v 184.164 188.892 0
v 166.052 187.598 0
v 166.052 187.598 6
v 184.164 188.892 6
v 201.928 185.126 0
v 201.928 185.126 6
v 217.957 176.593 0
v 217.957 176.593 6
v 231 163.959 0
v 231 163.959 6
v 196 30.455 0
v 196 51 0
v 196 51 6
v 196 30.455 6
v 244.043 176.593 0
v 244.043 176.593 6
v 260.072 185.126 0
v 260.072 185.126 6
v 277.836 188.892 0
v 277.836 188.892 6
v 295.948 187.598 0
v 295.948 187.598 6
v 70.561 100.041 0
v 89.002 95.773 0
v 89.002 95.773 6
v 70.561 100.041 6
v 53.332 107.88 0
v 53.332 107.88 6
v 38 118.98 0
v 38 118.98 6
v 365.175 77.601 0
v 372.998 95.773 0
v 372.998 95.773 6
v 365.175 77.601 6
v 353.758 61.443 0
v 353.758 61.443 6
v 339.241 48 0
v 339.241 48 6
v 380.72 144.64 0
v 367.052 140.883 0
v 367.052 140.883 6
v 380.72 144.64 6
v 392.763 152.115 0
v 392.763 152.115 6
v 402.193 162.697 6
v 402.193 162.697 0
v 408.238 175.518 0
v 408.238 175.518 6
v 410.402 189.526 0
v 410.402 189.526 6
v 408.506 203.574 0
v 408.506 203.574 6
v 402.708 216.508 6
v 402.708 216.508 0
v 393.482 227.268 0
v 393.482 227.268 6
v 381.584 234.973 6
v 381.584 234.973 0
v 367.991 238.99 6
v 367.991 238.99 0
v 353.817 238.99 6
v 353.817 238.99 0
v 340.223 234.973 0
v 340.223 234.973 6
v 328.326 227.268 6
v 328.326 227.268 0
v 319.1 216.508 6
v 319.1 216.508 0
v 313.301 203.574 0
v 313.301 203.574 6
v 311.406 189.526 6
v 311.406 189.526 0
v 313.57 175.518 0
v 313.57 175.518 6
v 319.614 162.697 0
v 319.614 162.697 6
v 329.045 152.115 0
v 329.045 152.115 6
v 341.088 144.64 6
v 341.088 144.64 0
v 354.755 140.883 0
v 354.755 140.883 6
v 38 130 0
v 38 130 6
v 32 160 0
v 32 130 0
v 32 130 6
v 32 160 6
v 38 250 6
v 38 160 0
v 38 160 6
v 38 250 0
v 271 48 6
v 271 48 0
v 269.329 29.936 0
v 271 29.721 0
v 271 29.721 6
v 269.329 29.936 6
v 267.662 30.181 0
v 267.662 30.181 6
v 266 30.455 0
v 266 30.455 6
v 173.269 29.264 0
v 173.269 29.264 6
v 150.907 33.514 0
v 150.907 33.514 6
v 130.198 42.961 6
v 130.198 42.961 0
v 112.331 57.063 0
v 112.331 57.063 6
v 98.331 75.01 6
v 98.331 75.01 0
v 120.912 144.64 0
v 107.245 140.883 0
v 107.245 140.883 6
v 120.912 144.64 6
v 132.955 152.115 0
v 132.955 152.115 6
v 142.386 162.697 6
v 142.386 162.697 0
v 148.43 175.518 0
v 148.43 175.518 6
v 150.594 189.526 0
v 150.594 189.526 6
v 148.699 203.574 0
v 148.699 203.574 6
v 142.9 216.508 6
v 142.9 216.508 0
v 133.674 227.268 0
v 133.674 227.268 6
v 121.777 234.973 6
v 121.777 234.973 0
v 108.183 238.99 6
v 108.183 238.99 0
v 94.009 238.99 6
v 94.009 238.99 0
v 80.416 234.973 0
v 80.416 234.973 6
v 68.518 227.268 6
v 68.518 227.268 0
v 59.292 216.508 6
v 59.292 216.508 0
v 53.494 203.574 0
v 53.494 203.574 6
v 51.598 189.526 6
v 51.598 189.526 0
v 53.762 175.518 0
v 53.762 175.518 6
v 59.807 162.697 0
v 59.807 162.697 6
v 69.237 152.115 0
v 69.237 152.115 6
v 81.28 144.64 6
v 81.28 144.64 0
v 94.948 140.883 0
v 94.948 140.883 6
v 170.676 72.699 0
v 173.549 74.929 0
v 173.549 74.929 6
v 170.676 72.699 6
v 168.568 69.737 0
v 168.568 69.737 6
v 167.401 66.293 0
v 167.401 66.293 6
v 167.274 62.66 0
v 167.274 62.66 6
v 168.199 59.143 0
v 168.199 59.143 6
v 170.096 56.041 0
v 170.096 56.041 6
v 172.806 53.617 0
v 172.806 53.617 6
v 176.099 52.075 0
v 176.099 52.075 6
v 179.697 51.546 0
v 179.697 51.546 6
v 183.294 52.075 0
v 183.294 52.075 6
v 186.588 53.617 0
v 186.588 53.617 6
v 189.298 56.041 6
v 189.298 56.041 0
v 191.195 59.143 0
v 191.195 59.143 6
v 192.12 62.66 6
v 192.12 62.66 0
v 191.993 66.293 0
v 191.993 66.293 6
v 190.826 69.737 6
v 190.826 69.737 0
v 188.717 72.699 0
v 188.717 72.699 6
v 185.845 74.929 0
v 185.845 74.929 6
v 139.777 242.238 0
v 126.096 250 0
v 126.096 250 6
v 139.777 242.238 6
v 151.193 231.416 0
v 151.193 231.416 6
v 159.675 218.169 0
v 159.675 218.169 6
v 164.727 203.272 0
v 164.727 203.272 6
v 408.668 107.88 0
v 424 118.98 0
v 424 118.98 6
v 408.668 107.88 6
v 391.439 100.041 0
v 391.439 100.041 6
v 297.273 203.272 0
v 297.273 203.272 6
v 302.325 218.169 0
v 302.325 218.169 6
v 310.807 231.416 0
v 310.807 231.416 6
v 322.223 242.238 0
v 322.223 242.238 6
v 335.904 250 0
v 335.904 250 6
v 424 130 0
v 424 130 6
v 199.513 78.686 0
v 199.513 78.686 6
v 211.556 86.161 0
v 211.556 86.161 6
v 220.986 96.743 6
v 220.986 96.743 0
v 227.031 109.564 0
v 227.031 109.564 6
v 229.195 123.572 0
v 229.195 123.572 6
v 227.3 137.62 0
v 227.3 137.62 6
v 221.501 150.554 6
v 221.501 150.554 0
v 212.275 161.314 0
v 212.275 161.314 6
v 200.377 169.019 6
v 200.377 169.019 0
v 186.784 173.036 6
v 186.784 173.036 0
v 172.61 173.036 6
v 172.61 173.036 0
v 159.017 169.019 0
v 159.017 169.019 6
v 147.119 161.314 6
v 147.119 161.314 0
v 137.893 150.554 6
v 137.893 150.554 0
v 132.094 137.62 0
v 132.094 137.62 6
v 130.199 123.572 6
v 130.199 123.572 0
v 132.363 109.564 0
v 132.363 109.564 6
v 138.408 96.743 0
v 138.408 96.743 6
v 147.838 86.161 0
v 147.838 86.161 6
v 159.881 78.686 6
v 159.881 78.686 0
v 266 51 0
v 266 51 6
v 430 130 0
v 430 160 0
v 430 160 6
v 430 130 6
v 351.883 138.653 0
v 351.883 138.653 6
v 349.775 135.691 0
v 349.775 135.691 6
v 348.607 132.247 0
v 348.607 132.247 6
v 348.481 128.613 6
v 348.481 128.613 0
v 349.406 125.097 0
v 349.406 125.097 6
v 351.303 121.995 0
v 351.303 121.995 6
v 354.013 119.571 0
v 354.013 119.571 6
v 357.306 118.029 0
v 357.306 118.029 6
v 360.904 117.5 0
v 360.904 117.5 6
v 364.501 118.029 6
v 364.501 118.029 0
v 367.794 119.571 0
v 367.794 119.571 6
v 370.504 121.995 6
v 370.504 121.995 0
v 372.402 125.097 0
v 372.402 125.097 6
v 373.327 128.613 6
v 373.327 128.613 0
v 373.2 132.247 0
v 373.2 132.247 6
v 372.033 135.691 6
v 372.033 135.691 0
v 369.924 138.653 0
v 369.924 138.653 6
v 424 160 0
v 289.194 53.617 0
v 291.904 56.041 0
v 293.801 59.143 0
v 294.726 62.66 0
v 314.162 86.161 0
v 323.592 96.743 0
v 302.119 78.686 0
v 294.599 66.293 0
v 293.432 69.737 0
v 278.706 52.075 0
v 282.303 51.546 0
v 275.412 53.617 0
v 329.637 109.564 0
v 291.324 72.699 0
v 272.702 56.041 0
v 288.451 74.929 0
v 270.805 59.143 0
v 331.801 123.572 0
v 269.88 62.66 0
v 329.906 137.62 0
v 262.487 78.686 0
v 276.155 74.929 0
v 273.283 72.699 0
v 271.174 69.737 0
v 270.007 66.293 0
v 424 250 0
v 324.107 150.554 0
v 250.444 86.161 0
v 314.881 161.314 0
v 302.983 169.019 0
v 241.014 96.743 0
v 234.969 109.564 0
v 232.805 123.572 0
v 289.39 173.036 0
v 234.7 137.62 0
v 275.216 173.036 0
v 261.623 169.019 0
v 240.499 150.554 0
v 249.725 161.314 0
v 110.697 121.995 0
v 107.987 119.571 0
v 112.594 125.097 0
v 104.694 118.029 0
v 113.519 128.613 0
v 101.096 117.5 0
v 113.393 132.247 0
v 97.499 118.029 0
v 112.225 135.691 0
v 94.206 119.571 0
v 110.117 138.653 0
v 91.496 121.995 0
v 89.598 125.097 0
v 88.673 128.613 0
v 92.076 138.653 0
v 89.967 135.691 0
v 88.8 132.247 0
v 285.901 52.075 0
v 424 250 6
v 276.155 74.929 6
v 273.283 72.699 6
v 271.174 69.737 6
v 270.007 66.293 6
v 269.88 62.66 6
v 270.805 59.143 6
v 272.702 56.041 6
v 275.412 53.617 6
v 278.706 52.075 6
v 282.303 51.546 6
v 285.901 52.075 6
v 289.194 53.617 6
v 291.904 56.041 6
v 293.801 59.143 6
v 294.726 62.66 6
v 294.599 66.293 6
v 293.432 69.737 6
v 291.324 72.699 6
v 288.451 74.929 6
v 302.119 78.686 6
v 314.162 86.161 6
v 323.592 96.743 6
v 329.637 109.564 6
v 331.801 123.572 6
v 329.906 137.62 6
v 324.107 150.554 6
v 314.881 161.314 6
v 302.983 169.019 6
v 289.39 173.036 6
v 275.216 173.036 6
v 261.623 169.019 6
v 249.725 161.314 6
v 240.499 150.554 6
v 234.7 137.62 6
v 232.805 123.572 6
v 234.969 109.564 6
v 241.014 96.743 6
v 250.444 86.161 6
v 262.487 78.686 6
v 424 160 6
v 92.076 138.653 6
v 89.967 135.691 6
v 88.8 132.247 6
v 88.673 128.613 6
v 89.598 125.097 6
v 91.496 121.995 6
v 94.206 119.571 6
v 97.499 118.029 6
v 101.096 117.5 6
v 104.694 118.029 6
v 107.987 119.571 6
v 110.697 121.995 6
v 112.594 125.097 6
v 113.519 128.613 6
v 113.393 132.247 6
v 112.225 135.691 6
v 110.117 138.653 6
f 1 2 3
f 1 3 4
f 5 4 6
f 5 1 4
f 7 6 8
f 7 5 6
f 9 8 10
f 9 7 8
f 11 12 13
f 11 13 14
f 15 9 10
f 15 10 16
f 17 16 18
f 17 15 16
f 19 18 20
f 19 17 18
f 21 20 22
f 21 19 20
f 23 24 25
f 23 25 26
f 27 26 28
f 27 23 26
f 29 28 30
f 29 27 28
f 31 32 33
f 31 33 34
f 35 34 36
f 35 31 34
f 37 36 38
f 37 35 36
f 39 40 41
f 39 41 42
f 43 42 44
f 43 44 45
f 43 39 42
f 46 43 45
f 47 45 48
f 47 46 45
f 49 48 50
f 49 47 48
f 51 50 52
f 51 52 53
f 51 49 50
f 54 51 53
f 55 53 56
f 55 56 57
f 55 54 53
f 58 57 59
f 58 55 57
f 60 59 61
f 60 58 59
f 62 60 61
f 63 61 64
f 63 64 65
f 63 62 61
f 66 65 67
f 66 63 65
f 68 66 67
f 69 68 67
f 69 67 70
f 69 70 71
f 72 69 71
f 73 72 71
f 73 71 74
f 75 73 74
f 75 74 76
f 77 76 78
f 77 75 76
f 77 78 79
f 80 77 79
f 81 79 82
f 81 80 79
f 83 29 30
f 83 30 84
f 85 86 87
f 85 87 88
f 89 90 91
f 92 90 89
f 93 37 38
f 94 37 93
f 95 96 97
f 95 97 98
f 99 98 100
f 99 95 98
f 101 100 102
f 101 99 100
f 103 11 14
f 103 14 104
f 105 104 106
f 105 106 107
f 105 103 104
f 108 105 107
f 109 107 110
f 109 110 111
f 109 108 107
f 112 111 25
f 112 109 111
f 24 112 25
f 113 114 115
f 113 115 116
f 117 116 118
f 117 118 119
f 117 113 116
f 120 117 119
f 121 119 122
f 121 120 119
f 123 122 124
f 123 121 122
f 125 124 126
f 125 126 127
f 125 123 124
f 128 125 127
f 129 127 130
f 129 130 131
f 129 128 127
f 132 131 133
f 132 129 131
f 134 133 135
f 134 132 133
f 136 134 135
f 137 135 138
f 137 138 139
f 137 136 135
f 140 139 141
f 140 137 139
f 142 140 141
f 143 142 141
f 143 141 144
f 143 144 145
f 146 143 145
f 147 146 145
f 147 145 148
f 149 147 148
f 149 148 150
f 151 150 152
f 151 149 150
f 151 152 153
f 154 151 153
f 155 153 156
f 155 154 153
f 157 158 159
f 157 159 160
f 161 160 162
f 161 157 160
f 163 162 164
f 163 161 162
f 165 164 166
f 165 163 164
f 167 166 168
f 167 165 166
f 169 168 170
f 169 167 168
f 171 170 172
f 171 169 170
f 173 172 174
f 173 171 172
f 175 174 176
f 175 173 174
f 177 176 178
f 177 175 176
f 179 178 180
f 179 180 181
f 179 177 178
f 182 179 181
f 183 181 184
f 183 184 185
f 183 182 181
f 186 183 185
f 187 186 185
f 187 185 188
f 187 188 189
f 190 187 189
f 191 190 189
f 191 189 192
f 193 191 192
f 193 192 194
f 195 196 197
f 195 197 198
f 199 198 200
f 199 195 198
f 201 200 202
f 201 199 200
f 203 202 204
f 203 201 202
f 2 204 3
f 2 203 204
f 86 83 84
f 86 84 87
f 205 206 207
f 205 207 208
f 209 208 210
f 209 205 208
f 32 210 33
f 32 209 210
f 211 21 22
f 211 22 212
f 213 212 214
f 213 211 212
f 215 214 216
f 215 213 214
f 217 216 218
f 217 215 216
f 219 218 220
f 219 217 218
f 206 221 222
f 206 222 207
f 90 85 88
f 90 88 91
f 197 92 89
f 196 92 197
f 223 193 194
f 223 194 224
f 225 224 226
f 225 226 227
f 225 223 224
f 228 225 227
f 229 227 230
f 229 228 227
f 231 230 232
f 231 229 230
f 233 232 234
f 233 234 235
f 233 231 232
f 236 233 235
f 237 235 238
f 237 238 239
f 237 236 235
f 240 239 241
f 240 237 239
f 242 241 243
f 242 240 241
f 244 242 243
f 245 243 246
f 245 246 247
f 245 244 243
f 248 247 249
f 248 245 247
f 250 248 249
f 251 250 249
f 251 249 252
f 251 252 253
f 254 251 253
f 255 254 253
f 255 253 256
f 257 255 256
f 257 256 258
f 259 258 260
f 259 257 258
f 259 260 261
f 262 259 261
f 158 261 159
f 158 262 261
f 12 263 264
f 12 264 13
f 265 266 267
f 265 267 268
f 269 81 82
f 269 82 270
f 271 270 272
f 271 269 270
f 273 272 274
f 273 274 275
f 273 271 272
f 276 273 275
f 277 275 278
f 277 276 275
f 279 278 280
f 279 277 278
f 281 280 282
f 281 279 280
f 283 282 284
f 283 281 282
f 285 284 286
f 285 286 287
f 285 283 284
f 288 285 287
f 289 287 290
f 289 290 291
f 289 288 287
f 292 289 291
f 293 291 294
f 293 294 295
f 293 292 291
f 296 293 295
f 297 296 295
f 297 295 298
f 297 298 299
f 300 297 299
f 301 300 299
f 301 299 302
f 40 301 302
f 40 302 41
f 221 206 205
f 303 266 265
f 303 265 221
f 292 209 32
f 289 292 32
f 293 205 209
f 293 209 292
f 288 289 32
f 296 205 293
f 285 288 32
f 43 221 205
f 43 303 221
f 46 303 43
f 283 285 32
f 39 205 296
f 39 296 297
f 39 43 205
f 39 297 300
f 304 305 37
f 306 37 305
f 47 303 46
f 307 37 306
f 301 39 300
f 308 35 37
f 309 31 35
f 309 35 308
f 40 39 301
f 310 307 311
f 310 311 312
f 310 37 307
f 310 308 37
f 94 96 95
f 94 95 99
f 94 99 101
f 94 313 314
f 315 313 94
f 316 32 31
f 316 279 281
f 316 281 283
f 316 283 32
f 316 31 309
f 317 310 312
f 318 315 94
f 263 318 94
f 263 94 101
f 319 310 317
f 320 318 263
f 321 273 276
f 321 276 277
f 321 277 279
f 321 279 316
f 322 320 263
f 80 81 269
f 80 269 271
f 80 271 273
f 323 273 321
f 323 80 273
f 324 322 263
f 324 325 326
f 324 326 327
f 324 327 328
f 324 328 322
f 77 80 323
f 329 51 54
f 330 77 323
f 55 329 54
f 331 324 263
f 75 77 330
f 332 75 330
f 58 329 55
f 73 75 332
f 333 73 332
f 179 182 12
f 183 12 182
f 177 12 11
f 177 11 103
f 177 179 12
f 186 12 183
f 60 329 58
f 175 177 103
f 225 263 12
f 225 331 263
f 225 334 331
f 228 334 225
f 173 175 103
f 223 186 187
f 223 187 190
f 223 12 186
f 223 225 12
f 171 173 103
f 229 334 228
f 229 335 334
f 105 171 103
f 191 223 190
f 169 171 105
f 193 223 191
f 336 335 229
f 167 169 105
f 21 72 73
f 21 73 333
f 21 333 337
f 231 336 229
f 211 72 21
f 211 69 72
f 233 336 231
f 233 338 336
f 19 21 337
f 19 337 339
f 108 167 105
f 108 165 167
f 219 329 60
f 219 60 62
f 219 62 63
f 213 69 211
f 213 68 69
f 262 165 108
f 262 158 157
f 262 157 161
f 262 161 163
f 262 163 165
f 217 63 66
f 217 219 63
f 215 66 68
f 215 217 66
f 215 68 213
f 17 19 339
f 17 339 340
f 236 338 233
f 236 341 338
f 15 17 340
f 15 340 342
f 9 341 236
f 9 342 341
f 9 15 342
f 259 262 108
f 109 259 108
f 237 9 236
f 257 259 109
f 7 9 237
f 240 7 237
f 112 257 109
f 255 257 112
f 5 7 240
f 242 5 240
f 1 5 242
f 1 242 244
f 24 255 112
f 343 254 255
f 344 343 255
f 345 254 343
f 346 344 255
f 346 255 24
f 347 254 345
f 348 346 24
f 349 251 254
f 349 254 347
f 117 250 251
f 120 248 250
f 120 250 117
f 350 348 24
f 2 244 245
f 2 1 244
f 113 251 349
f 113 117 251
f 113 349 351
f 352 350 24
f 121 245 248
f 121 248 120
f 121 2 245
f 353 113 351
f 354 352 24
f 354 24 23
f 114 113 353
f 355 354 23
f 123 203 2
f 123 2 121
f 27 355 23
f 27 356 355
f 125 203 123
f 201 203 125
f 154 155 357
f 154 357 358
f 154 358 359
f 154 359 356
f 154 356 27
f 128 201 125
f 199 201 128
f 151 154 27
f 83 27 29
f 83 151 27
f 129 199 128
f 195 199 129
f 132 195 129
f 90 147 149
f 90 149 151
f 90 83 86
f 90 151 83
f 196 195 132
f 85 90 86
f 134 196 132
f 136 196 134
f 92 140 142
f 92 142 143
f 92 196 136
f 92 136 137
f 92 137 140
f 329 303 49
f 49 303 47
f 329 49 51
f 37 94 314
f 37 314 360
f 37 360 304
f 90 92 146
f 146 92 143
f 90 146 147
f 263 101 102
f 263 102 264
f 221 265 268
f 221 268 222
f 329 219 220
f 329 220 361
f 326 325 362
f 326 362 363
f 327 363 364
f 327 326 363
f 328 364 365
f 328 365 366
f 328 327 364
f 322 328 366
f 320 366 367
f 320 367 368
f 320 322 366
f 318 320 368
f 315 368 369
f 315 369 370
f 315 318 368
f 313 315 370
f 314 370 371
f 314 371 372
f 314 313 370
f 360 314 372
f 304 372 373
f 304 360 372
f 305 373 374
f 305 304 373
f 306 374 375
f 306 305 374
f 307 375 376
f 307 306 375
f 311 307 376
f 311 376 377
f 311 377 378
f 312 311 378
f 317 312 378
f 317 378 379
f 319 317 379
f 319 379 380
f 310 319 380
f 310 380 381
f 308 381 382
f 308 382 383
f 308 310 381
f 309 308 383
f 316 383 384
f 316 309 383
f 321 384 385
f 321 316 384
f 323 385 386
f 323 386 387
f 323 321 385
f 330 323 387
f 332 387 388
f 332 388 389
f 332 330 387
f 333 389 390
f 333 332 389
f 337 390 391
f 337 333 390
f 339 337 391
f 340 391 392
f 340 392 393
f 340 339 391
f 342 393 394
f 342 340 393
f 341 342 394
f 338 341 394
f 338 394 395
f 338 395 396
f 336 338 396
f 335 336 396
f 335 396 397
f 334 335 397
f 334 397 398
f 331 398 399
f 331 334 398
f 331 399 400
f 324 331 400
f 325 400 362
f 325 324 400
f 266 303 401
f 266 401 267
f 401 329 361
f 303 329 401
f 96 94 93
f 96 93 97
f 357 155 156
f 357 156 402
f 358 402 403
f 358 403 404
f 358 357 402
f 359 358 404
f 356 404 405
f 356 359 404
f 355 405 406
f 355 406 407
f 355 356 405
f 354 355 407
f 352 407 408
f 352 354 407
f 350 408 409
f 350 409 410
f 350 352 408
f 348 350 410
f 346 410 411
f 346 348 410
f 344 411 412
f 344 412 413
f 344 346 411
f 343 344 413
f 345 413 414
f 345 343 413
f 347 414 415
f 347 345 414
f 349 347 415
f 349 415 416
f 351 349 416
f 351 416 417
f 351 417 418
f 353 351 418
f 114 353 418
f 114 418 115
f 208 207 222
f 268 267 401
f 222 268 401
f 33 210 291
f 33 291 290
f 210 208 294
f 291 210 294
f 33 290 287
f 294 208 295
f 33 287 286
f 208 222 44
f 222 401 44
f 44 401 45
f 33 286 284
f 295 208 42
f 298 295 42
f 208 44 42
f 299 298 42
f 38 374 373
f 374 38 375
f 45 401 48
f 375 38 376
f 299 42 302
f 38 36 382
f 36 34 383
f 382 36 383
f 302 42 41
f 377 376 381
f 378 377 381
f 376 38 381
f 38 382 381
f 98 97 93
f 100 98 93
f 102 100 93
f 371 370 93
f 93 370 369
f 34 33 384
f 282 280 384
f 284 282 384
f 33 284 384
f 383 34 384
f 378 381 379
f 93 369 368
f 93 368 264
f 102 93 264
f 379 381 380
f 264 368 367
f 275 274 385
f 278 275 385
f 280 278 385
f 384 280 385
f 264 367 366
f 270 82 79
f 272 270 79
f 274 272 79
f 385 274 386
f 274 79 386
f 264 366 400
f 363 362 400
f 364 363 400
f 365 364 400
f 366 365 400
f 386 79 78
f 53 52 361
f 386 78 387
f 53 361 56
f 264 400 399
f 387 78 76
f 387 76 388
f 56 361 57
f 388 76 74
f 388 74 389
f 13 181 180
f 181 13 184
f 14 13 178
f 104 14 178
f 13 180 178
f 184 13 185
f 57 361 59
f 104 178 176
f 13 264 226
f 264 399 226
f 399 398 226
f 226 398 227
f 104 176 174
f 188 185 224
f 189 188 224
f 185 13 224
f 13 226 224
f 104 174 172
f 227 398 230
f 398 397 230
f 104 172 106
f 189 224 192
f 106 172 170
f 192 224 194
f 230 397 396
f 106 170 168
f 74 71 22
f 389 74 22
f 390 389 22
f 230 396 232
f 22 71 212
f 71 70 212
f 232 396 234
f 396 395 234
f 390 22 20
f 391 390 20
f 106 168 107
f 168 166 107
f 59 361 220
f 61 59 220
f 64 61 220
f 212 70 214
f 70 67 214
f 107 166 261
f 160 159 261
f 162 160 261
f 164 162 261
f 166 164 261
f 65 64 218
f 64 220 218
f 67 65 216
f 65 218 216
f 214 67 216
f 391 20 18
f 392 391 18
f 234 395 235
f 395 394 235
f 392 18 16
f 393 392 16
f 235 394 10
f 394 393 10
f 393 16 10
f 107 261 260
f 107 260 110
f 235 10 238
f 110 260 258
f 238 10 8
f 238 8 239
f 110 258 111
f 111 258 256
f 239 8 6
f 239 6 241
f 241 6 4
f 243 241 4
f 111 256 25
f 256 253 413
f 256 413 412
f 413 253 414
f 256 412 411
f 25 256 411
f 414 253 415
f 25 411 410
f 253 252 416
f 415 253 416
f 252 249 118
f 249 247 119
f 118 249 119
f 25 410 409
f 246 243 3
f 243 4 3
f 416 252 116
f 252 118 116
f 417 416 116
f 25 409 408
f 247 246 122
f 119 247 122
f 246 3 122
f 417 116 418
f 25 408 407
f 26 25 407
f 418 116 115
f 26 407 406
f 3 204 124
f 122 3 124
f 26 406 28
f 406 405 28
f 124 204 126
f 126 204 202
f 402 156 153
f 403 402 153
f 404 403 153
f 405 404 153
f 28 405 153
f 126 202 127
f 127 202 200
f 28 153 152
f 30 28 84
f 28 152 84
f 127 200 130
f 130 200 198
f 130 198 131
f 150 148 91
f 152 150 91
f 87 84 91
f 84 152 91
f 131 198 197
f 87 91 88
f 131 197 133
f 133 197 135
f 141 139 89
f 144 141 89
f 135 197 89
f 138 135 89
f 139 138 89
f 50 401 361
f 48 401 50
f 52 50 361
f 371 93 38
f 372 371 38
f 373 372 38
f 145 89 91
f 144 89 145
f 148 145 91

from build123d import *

# Parameters (mm, degrees)
EXTRUDE_1_DEPTH = 6


with BuildPart() as part:
    # Эскиз1 → Бобышка-Вытянуть1 (new body)
    with BuildSketch(Plane.XY):
        with BuildLine():
            Line((424, 250), (424, 160))
            Line((424, 160), (430, 160))
            Line((430, 160), (430, 130))
            Line((430, 130), (424, 130))
            Line((424, 130), (424, 118.979785419))
            ThreePointArc((424, 118.979785419), (400.249049588, 103.530628738), (372.998295097, 95.773021676))
            ThreePointArc((372.998295097, 95.773021676), (359.88843335, 69.223630945), (339.241493801, 48))
            Line((339.241493801, 48), (271, 48))
            Line((271, 48), (271, 29.720915629))
            ThreePointArc((271, 29.720915629), (268.495114821, 30.054927971), (266, 30.455447679))
            Line((266, 30.455447679), (266, 51))
            Line((266, 51), (196, 51))
            Line((196, 51), (196, 30.455447679))
            ThreePointArc((196, 30.455447679), (130.198007186, 42.960646788), (89.001704904, 95.773021676))
            ThreePointArc((89.001704904, 95.773021676), (61.750950412, 103.530628738), (38, 118.979785419))
            Line((38, 118.979785419), (38, 130))
            Line((38, 130), (32, 130))
            Line((32, 130), (32, 160))
            Line((32, 160), (38, 160))
            Line((38, 160), (38, 250))
            Line((38, 250), (126.096189432, 250))
            ThreePointArc((126.096189432, 250), (155.836604626, 225.049778093), (166.051782667, 187.59772866))
            ThreePointArc((166.051782667, 187.59772866), (201.928287817, 185.126127233), (231, 163.958510782))
            ThreePointArc((231, 163.958510782), (260.071712183, 185.126127233), (295.948217333, 187.59772866))
            ThreePointArc((295.948217333, 187.59772866), (306.163395374, 225.049778093), (335.903810568, 250))
            Line((335.903810568, 250), (424, 250))
        make_face()
        with BuildLine():
            ThreePointArc((107.24460838, 140.883333333), (101.096189432, 239.5), (94.947770485, 140.883333333))
            ThreePointArc((94.947770485, 140.883333333), (101.096189432, 117.5), (107.24460838, 140.883333333))
        make_face(mode=Mode.SUBTRACT)
        with BuildLine():
            ThreePointArc((185.845397449, 74.929440215), (179.696978501, 173.546106882), (173.548559554, 74.929440215))
            ThreePointArc((173.548559554, 74.929440215), (179.696978501, 51.546106882), (185.845397449, 74.929440215))
        make_face(mode=Mode.SUBTRACT)
        with BuildLine():
            ThreePointArc((288.451440446, 74.929440215), (282.303021499, 173.546106882), (276.154602551, 74.929440215))
            ThreePointArc((276.154602551, 74.929440215), (282.303021499, 51.546106882), (288.451440446, 74.929440215))
        make_face(mode=Mode.SUBTRACT)
        with BuildLine():
            ThreePointArc((367.052229515, 140.883333333), (360.903810568, 239.5), (354.75539162, 140.883333333))
            ThreePointArc((354.75539162, 140.883333333), (360.903810568, 117.5), (367.052229515, 140.883333333))
        make_face(mode=Mode.SUBTRACT)
    extrude(amount=EXTRUDE_1_DEPTH)


solid = part.part
